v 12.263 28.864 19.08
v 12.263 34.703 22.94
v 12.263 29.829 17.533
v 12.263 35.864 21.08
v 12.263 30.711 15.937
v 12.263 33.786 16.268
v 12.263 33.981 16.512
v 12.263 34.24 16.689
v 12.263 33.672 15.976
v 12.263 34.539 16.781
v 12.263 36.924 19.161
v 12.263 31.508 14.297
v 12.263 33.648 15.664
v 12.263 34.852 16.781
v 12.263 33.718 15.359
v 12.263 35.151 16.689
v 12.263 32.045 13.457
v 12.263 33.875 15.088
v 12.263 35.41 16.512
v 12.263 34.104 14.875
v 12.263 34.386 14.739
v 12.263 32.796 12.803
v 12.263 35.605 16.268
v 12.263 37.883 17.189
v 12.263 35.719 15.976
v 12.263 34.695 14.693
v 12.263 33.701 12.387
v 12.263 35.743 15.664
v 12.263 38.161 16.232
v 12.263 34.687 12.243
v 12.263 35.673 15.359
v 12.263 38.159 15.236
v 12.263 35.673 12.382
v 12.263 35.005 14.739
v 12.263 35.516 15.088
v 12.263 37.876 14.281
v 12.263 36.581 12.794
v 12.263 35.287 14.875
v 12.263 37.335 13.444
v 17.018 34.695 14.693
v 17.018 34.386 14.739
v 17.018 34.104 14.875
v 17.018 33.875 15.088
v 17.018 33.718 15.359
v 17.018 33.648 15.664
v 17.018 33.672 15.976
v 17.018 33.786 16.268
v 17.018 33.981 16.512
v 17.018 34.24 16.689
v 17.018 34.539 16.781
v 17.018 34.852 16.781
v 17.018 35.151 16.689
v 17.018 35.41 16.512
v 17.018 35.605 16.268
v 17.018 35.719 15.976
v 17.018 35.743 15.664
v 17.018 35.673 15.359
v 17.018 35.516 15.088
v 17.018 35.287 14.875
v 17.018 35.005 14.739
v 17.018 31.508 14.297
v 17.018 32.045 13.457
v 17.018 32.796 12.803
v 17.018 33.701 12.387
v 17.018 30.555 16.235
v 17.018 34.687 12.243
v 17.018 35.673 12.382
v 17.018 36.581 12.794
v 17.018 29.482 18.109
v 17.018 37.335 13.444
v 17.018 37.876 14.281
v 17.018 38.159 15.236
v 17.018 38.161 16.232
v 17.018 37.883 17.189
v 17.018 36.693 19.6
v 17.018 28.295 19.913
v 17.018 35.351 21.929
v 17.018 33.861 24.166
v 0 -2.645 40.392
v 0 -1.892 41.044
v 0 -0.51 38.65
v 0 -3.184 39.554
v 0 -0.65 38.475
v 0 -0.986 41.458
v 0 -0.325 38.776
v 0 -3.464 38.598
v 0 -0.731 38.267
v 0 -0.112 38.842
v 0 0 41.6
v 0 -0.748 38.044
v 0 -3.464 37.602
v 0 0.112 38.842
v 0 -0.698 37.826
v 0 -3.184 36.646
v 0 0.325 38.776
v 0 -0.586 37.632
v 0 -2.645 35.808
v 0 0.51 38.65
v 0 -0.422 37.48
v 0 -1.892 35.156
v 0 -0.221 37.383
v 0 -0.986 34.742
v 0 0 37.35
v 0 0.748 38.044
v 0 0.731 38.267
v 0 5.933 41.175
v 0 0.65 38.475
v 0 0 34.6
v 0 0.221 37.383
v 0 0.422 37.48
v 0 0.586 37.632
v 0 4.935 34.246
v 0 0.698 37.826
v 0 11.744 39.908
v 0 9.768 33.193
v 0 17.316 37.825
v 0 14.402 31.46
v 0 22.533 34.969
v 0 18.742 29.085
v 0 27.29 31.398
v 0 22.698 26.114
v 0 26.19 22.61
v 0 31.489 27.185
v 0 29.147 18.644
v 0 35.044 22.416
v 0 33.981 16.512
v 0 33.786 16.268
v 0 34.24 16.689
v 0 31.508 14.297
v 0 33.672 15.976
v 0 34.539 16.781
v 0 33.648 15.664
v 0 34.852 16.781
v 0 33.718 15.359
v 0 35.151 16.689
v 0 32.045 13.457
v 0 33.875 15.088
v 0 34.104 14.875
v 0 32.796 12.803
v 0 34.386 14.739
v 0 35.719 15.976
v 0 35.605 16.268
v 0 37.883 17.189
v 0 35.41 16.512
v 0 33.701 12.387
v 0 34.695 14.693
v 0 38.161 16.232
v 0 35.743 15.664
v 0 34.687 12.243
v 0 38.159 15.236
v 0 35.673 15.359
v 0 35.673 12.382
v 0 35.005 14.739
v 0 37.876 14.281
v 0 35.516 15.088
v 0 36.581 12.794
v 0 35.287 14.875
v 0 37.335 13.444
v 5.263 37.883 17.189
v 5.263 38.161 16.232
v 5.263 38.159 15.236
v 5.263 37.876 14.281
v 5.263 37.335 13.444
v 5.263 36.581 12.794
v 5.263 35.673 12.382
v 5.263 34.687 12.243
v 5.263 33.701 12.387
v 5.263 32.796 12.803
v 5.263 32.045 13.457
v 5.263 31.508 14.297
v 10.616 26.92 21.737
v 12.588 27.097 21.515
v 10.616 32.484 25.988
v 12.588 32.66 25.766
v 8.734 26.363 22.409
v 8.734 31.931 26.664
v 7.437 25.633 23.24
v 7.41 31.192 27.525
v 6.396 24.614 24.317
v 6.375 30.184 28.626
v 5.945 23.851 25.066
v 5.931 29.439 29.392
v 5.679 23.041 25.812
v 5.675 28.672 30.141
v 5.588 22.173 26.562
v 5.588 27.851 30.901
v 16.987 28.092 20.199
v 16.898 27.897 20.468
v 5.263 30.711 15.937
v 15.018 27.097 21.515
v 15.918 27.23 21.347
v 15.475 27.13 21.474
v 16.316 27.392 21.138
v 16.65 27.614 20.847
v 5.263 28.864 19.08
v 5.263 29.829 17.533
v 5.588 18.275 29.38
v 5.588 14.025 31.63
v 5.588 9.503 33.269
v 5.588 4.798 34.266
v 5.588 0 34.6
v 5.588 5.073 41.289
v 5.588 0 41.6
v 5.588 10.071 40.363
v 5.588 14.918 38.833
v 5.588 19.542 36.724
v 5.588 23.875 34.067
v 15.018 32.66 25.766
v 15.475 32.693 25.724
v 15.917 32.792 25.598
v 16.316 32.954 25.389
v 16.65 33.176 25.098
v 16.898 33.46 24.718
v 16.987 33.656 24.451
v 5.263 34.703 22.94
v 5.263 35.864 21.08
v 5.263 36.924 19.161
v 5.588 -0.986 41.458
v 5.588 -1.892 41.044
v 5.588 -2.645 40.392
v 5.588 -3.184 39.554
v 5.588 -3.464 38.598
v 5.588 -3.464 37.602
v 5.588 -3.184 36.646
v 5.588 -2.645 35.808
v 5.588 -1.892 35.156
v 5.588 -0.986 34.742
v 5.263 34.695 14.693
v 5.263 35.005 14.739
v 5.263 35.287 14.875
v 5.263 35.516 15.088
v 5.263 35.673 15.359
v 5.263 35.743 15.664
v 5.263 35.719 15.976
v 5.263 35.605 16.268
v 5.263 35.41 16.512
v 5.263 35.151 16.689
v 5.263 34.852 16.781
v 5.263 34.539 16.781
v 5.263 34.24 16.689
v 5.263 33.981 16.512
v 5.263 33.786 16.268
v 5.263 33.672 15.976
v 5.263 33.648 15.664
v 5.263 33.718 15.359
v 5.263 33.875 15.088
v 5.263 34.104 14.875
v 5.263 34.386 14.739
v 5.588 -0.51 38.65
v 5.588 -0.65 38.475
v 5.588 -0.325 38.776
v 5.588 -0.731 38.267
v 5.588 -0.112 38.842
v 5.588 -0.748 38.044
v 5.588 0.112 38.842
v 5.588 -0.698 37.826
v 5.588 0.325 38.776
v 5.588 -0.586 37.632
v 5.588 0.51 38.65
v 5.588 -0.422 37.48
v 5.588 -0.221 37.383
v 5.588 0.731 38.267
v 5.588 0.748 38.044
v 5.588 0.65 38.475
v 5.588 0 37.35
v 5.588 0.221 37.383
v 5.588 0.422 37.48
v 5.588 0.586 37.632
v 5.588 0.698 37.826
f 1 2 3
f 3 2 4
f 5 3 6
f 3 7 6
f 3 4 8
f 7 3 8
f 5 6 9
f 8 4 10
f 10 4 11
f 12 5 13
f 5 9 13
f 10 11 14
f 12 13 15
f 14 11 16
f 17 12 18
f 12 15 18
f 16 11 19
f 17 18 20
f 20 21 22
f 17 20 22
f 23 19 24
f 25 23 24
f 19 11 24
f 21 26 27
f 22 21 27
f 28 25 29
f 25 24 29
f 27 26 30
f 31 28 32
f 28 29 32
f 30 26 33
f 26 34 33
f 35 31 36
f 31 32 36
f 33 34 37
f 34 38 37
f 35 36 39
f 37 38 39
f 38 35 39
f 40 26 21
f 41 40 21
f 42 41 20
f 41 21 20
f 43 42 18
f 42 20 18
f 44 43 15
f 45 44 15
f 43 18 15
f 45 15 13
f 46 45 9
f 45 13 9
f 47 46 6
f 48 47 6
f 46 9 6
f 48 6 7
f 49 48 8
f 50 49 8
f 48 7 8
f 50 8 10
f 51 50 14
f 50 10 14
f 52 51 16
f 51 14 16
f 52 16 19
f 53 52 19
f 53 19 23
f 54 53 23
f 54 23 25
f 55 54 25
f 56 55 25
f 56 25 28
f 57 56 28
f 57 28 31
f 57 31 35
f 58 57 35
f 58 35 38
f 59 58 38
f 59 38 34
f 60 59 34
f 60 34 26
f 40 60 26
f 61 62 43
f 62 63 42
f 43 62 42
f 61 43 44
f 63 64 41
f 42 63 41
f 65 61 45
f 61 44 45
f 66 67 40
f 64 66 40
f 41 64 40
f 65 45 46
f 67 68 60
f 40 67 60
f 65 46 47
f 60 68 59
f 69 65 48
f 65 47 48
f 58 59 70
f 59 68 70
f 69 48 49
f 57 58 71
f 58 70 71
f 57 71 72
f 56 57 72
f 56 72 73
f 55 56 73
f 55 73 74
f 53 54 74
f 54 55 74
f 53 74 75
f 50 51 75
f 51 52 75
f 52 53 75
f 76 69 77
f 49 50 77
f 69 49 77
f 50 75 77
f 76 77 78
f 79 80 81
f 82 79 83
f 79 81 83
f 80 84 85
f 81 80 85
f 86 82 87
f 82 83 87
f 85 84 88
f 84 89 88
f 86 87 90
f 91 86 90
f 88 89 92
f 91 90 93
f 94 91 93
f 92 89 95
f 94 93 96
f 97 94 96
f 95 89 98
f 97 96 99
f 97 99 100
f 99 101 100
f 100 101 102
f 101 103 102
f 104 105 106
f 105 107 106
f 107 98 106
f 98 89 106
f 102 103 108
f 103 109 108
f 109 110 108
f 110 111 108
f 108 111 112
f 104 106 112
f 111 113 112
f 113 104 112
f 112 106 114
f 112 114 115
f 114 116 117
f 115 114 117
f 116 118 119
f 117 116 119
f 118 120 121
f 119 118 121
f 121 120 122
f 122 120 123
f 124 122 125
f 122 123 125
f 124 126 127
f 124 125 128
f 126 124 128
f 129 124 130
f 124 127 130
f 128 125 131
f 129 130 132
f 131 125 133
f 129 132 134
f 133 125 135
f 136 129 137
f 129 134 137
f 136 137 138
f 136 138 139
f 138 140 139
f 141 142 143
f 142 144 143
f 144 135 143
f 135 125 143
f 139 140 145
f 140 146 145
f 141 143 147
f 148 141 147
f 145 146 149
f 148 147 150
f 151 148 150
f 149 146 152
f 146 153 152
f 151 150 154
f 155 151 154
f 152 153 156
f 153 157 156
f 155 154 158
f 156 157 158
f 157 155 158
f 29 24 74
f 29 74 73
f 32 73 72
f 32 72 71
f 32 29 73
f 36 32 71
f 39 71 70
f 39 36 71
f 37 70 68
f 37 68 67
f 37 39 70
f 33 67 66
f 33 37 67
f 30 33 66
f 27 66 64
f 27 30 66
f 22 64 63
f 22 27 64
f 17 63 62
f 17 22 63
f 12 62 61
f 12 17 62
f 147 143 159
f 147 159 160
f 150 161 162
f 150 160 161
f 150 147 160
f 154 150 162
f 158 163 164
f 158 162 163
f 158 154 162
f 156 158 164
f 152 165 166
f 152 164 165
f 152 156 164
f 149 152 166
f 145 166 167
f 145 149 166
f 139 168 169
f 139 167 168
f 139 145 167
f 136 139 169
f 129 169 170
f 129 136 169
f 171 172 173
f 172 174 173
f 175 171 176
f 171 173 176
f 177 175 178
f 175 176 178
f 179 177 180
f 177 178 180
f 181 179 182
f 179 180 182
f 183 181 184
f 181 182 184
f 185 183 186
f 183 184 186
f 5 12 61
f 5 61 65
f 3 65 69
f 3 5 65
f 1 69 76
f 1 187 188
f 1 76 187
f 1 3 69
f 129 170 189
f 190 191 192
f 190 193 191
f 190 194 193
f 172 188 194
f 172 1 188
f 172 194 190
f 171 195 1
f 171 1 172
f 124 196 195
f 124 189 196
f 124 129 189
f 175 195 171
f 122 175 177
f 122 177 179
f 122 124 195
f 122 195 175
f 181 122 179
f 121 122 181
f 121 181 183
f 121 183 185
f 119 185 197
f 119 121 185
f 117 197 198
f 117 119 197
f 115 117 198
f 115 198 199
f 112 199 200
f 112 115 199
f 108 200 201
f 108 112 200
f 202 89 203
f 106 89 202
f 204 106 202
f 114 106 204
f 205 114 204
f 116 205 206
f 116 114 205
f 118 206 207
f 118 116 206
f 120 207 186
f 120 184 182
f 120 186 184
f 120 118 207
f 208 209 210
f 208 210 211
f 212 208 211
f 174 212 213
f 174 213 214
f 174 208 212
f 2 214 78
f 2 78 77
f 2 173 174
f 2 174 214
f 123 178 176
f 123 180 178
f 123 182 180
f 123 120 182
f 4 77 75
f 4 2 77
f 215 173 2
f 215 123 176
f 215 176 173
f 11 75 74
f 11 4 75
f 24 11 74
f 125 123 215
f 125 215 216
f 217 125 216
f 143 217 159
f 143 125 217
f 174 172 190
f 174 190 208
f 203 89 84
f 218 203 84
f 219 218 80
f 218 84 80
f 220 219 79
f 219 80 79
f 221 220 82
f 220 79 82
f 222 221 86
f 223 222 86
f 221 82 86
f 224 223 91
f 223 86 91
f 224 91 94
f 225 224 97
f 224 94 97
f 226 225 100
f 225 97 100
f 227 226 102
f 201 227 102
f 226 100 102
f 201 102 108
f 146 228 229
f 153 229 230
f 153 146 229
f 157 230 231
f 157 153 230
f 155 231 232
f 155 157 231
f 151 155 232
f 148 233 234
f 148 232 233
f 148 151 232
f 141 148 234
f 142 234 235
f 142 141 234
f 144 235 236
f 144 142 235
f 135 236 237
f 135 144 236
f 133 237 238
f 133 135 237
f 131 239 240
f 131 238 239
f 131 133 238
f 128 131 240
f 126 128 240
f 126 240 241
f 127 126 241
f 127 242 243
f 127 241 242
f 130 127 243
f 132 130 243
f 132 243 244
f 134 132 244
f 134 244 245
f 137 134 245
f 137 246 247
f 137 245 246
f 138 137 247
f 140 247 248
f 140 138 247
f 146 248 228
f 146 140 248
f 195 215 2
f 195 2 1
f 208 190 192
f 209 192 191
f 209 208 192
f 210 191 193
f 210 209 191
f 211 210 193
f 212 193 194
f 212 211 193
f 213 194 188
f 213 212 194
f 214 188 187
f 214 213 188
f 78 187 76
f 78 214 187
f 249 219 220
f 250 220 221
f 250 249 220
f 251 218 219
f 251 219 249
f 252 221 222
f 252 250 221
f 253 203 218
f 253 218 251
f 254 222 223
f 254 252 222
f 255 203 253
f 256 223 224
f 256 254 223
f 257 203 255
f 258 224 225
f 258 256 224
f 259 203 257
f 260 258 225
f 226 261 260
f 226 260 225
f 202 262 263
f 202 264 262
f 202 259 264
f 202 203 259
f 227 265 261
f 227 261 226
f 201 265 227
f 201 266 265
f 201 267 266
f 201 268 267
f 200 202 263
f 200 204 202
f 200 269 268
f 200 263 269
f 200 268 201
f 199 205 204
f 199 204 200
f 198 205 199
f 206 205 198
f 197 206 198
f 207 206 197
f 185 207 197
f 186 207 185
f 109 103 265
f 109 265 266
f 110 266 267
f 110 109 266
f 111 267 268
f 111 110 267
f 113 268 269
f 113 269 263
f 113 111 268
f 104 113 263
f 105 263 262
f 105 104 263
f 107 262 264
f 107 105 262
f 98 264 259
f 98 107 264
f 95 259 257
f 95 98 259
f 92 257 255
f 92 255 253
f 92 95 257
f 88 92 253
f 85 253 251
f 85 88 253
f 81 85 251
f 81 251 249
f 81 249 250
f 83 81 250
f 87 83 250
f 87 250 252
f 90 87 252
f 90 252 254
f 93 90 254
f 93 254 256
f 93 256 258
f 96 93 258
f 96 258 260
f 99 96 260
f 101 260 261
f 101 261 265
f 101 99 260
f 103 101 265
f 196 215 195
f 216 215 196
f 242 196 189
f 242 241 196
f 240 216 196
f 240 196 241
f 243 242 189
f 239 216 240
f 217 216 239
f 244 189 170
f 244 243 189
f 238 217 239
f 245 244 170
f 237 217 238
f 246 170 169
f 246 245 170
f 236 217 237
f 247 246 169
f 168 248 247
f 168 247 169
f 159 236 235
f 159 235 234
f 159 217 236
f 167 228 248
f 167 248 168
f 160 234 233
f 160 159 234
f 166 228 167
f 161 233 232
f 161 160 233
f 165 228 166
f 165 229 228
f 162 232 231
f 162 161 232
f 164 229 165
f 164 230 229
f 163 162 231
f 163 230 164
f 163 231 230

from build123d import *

# Parameters (mm, degrees)
ESQUISSE1_R                  = 0.7499999999999986
ESQUISSE1_R_2                = 1.050000000000001
BOSS_EXTRU_1_DEPTH           = 5.588
BOSS_EXTRU_2_DEPTH           = 11.43
ENL_V_MAT_EXTRU_1_DEPTH      = 3.5
ENL_V_MAT_EXTRU_1_DEPTH_BACK = 3.5
CONG_1_R                     = 7
CONG_2_R                     = 2
ESQUISSE5_R                  = 1.0500000000000025
ENL_V_MAT_EXTRU_2_DEPTH      = 59.98362409134528


with BuildPart() as part:
    # Esquisse1 → Boss.-Extru.1 (new body)
    with BuildSketch(Plane(origin=(0, 0, 0), x_dir=(0, 0, -1), z_dir=(1, 0, 0))):
        with BuildLine():
            ThreePointArc((-34.6, 0), (-29.084530777641156, 18.741666666666667), (-14.296527777777778, 31.508241675777914))
            ThreePointArc((-14.296527777777778, 31.508241675777914), (-12.55545845283557, 36.141672111831234), (-17.18888888888889, 37.88274143677345))
            ThreePointArc((-17.18888888888889, 37.88274143677345), (-34.968684403175494, 22.53333333333333), (-41.6, 0))
            ThreePointArc((-41.6, 0), (-38.1, -3.5), (-34.6, 0))
        make_face()
        with Locations((-38.1, 0)):
            Circle(ESQUISSE1_R, mode=Mode.SUBTRACT)
        with Locations((-15.742708333333335, 34.69549155627568)):
            Circle(ESQUISSE1_R_2, mode=Mode.SUBTRACT)
    extrude(amount=BOSS_EXTRU_1_DEPTH)

    # Esquisse2 → Boss.-Extru.2 (add)
    with BuildSketch(Plane(origin=(5.588, 0, 0), x_dir=(0, 0, -1), z_dir=(1, 0, 0))):
        with BuildLine():
            Line((-21.515108455003254, 27.09723432694649), (-25.765862615540357, 32.66007231585839))
            ThreePointArc((-25.765862615540357, 32.66007231585839), (-21.63554338093815, 35.53115903839253), (-17.188888888888894, 37.88274143677345))
            ThreePointArc((-17.188888888888894, 37.88274143677345), (-12.555458452835564, 36.141672111831234), (-14.296527777777776, 31.508241675777906))
            ThreePointArc((-14.296527777777776, 31.508241675777906), (-18.04113546523944, 29.52418383503393), (-21.515108455003254, 27.09723432694649))
        make_face()
    extrude(amount=BOSS_EXTRU_2_DEPTH)

    # Esquisse4 → Enlèv. mat.-Extru.1 (cut, two sides: drawn at the far end of the back side and taken through both)
    with BuildSketch(Plane(origin=(8.762999999999998, 0, 0), x_dir=(0, 0, -1), z_dir=(1, 0, 0)).offset(-ENL_V_MAT_EXTRU_1_DEPTH_BACK)):
        with BuildLine():
            Line((-22.940194161396708, 34.703133746643395), (-19.080065336161688, 28.86366412581397))
            ThreePointArc((-19.080065336161688, 28.86366412581397), (-16.740600036372985, 30.28055994234895), (-14.296527777777776, 31.508241675777906))
            ThreePointArc((-14.296527777777776, 31.508241675777906), (-12.555458452835564, 36.141672111831234), (-17.188888888888894, 37.88274143677345))
            ThreePointArc((-17.188888888888894, 37.88274143677345), (-20.127426633327065, 36.40668478617679), (-22.940194161396708, 34.703133746643395))
        make_face()
    extrude(amount=ENL_V_MAT_EXTRU_1_DEPTH + ENL_V_MAT_EXTRU_1_DEPTH_BACK, mode=Mode.SUBTRACT)

    # Congé1
    cong_1_edges = [part.edges().sort_by_distance(p)[0] for p in [
        (5.588, 29.878653321402442, 23.640485535271807),
    ]]
    fillet(cong_1_edges, radius=CONG_1_R)

    # Congé2
    cong_2_edges = [part.edges().sort_by_distance(p)[0] for p in [
        (17.018, 29.878653321402442, 23.640485535271807),
    ]]
    fillet(cong_2_edges, radius=CONG_2_R)

    # Esquisse5 → Enlèv. mat.-Extru.2 (cut, through all)
    with BuildSketch(Plane.ZY):
        with Locations(Location((15.742708333333335, 34.69549155627568, 0), (0, 0, 180))):
            Circle(ESQUISSE5_R)
    extrude(amount=-ENL_V_MAT_EXTRU_2_DEPTH, mode=Mode.SUBTRACT)


solid = part.part
